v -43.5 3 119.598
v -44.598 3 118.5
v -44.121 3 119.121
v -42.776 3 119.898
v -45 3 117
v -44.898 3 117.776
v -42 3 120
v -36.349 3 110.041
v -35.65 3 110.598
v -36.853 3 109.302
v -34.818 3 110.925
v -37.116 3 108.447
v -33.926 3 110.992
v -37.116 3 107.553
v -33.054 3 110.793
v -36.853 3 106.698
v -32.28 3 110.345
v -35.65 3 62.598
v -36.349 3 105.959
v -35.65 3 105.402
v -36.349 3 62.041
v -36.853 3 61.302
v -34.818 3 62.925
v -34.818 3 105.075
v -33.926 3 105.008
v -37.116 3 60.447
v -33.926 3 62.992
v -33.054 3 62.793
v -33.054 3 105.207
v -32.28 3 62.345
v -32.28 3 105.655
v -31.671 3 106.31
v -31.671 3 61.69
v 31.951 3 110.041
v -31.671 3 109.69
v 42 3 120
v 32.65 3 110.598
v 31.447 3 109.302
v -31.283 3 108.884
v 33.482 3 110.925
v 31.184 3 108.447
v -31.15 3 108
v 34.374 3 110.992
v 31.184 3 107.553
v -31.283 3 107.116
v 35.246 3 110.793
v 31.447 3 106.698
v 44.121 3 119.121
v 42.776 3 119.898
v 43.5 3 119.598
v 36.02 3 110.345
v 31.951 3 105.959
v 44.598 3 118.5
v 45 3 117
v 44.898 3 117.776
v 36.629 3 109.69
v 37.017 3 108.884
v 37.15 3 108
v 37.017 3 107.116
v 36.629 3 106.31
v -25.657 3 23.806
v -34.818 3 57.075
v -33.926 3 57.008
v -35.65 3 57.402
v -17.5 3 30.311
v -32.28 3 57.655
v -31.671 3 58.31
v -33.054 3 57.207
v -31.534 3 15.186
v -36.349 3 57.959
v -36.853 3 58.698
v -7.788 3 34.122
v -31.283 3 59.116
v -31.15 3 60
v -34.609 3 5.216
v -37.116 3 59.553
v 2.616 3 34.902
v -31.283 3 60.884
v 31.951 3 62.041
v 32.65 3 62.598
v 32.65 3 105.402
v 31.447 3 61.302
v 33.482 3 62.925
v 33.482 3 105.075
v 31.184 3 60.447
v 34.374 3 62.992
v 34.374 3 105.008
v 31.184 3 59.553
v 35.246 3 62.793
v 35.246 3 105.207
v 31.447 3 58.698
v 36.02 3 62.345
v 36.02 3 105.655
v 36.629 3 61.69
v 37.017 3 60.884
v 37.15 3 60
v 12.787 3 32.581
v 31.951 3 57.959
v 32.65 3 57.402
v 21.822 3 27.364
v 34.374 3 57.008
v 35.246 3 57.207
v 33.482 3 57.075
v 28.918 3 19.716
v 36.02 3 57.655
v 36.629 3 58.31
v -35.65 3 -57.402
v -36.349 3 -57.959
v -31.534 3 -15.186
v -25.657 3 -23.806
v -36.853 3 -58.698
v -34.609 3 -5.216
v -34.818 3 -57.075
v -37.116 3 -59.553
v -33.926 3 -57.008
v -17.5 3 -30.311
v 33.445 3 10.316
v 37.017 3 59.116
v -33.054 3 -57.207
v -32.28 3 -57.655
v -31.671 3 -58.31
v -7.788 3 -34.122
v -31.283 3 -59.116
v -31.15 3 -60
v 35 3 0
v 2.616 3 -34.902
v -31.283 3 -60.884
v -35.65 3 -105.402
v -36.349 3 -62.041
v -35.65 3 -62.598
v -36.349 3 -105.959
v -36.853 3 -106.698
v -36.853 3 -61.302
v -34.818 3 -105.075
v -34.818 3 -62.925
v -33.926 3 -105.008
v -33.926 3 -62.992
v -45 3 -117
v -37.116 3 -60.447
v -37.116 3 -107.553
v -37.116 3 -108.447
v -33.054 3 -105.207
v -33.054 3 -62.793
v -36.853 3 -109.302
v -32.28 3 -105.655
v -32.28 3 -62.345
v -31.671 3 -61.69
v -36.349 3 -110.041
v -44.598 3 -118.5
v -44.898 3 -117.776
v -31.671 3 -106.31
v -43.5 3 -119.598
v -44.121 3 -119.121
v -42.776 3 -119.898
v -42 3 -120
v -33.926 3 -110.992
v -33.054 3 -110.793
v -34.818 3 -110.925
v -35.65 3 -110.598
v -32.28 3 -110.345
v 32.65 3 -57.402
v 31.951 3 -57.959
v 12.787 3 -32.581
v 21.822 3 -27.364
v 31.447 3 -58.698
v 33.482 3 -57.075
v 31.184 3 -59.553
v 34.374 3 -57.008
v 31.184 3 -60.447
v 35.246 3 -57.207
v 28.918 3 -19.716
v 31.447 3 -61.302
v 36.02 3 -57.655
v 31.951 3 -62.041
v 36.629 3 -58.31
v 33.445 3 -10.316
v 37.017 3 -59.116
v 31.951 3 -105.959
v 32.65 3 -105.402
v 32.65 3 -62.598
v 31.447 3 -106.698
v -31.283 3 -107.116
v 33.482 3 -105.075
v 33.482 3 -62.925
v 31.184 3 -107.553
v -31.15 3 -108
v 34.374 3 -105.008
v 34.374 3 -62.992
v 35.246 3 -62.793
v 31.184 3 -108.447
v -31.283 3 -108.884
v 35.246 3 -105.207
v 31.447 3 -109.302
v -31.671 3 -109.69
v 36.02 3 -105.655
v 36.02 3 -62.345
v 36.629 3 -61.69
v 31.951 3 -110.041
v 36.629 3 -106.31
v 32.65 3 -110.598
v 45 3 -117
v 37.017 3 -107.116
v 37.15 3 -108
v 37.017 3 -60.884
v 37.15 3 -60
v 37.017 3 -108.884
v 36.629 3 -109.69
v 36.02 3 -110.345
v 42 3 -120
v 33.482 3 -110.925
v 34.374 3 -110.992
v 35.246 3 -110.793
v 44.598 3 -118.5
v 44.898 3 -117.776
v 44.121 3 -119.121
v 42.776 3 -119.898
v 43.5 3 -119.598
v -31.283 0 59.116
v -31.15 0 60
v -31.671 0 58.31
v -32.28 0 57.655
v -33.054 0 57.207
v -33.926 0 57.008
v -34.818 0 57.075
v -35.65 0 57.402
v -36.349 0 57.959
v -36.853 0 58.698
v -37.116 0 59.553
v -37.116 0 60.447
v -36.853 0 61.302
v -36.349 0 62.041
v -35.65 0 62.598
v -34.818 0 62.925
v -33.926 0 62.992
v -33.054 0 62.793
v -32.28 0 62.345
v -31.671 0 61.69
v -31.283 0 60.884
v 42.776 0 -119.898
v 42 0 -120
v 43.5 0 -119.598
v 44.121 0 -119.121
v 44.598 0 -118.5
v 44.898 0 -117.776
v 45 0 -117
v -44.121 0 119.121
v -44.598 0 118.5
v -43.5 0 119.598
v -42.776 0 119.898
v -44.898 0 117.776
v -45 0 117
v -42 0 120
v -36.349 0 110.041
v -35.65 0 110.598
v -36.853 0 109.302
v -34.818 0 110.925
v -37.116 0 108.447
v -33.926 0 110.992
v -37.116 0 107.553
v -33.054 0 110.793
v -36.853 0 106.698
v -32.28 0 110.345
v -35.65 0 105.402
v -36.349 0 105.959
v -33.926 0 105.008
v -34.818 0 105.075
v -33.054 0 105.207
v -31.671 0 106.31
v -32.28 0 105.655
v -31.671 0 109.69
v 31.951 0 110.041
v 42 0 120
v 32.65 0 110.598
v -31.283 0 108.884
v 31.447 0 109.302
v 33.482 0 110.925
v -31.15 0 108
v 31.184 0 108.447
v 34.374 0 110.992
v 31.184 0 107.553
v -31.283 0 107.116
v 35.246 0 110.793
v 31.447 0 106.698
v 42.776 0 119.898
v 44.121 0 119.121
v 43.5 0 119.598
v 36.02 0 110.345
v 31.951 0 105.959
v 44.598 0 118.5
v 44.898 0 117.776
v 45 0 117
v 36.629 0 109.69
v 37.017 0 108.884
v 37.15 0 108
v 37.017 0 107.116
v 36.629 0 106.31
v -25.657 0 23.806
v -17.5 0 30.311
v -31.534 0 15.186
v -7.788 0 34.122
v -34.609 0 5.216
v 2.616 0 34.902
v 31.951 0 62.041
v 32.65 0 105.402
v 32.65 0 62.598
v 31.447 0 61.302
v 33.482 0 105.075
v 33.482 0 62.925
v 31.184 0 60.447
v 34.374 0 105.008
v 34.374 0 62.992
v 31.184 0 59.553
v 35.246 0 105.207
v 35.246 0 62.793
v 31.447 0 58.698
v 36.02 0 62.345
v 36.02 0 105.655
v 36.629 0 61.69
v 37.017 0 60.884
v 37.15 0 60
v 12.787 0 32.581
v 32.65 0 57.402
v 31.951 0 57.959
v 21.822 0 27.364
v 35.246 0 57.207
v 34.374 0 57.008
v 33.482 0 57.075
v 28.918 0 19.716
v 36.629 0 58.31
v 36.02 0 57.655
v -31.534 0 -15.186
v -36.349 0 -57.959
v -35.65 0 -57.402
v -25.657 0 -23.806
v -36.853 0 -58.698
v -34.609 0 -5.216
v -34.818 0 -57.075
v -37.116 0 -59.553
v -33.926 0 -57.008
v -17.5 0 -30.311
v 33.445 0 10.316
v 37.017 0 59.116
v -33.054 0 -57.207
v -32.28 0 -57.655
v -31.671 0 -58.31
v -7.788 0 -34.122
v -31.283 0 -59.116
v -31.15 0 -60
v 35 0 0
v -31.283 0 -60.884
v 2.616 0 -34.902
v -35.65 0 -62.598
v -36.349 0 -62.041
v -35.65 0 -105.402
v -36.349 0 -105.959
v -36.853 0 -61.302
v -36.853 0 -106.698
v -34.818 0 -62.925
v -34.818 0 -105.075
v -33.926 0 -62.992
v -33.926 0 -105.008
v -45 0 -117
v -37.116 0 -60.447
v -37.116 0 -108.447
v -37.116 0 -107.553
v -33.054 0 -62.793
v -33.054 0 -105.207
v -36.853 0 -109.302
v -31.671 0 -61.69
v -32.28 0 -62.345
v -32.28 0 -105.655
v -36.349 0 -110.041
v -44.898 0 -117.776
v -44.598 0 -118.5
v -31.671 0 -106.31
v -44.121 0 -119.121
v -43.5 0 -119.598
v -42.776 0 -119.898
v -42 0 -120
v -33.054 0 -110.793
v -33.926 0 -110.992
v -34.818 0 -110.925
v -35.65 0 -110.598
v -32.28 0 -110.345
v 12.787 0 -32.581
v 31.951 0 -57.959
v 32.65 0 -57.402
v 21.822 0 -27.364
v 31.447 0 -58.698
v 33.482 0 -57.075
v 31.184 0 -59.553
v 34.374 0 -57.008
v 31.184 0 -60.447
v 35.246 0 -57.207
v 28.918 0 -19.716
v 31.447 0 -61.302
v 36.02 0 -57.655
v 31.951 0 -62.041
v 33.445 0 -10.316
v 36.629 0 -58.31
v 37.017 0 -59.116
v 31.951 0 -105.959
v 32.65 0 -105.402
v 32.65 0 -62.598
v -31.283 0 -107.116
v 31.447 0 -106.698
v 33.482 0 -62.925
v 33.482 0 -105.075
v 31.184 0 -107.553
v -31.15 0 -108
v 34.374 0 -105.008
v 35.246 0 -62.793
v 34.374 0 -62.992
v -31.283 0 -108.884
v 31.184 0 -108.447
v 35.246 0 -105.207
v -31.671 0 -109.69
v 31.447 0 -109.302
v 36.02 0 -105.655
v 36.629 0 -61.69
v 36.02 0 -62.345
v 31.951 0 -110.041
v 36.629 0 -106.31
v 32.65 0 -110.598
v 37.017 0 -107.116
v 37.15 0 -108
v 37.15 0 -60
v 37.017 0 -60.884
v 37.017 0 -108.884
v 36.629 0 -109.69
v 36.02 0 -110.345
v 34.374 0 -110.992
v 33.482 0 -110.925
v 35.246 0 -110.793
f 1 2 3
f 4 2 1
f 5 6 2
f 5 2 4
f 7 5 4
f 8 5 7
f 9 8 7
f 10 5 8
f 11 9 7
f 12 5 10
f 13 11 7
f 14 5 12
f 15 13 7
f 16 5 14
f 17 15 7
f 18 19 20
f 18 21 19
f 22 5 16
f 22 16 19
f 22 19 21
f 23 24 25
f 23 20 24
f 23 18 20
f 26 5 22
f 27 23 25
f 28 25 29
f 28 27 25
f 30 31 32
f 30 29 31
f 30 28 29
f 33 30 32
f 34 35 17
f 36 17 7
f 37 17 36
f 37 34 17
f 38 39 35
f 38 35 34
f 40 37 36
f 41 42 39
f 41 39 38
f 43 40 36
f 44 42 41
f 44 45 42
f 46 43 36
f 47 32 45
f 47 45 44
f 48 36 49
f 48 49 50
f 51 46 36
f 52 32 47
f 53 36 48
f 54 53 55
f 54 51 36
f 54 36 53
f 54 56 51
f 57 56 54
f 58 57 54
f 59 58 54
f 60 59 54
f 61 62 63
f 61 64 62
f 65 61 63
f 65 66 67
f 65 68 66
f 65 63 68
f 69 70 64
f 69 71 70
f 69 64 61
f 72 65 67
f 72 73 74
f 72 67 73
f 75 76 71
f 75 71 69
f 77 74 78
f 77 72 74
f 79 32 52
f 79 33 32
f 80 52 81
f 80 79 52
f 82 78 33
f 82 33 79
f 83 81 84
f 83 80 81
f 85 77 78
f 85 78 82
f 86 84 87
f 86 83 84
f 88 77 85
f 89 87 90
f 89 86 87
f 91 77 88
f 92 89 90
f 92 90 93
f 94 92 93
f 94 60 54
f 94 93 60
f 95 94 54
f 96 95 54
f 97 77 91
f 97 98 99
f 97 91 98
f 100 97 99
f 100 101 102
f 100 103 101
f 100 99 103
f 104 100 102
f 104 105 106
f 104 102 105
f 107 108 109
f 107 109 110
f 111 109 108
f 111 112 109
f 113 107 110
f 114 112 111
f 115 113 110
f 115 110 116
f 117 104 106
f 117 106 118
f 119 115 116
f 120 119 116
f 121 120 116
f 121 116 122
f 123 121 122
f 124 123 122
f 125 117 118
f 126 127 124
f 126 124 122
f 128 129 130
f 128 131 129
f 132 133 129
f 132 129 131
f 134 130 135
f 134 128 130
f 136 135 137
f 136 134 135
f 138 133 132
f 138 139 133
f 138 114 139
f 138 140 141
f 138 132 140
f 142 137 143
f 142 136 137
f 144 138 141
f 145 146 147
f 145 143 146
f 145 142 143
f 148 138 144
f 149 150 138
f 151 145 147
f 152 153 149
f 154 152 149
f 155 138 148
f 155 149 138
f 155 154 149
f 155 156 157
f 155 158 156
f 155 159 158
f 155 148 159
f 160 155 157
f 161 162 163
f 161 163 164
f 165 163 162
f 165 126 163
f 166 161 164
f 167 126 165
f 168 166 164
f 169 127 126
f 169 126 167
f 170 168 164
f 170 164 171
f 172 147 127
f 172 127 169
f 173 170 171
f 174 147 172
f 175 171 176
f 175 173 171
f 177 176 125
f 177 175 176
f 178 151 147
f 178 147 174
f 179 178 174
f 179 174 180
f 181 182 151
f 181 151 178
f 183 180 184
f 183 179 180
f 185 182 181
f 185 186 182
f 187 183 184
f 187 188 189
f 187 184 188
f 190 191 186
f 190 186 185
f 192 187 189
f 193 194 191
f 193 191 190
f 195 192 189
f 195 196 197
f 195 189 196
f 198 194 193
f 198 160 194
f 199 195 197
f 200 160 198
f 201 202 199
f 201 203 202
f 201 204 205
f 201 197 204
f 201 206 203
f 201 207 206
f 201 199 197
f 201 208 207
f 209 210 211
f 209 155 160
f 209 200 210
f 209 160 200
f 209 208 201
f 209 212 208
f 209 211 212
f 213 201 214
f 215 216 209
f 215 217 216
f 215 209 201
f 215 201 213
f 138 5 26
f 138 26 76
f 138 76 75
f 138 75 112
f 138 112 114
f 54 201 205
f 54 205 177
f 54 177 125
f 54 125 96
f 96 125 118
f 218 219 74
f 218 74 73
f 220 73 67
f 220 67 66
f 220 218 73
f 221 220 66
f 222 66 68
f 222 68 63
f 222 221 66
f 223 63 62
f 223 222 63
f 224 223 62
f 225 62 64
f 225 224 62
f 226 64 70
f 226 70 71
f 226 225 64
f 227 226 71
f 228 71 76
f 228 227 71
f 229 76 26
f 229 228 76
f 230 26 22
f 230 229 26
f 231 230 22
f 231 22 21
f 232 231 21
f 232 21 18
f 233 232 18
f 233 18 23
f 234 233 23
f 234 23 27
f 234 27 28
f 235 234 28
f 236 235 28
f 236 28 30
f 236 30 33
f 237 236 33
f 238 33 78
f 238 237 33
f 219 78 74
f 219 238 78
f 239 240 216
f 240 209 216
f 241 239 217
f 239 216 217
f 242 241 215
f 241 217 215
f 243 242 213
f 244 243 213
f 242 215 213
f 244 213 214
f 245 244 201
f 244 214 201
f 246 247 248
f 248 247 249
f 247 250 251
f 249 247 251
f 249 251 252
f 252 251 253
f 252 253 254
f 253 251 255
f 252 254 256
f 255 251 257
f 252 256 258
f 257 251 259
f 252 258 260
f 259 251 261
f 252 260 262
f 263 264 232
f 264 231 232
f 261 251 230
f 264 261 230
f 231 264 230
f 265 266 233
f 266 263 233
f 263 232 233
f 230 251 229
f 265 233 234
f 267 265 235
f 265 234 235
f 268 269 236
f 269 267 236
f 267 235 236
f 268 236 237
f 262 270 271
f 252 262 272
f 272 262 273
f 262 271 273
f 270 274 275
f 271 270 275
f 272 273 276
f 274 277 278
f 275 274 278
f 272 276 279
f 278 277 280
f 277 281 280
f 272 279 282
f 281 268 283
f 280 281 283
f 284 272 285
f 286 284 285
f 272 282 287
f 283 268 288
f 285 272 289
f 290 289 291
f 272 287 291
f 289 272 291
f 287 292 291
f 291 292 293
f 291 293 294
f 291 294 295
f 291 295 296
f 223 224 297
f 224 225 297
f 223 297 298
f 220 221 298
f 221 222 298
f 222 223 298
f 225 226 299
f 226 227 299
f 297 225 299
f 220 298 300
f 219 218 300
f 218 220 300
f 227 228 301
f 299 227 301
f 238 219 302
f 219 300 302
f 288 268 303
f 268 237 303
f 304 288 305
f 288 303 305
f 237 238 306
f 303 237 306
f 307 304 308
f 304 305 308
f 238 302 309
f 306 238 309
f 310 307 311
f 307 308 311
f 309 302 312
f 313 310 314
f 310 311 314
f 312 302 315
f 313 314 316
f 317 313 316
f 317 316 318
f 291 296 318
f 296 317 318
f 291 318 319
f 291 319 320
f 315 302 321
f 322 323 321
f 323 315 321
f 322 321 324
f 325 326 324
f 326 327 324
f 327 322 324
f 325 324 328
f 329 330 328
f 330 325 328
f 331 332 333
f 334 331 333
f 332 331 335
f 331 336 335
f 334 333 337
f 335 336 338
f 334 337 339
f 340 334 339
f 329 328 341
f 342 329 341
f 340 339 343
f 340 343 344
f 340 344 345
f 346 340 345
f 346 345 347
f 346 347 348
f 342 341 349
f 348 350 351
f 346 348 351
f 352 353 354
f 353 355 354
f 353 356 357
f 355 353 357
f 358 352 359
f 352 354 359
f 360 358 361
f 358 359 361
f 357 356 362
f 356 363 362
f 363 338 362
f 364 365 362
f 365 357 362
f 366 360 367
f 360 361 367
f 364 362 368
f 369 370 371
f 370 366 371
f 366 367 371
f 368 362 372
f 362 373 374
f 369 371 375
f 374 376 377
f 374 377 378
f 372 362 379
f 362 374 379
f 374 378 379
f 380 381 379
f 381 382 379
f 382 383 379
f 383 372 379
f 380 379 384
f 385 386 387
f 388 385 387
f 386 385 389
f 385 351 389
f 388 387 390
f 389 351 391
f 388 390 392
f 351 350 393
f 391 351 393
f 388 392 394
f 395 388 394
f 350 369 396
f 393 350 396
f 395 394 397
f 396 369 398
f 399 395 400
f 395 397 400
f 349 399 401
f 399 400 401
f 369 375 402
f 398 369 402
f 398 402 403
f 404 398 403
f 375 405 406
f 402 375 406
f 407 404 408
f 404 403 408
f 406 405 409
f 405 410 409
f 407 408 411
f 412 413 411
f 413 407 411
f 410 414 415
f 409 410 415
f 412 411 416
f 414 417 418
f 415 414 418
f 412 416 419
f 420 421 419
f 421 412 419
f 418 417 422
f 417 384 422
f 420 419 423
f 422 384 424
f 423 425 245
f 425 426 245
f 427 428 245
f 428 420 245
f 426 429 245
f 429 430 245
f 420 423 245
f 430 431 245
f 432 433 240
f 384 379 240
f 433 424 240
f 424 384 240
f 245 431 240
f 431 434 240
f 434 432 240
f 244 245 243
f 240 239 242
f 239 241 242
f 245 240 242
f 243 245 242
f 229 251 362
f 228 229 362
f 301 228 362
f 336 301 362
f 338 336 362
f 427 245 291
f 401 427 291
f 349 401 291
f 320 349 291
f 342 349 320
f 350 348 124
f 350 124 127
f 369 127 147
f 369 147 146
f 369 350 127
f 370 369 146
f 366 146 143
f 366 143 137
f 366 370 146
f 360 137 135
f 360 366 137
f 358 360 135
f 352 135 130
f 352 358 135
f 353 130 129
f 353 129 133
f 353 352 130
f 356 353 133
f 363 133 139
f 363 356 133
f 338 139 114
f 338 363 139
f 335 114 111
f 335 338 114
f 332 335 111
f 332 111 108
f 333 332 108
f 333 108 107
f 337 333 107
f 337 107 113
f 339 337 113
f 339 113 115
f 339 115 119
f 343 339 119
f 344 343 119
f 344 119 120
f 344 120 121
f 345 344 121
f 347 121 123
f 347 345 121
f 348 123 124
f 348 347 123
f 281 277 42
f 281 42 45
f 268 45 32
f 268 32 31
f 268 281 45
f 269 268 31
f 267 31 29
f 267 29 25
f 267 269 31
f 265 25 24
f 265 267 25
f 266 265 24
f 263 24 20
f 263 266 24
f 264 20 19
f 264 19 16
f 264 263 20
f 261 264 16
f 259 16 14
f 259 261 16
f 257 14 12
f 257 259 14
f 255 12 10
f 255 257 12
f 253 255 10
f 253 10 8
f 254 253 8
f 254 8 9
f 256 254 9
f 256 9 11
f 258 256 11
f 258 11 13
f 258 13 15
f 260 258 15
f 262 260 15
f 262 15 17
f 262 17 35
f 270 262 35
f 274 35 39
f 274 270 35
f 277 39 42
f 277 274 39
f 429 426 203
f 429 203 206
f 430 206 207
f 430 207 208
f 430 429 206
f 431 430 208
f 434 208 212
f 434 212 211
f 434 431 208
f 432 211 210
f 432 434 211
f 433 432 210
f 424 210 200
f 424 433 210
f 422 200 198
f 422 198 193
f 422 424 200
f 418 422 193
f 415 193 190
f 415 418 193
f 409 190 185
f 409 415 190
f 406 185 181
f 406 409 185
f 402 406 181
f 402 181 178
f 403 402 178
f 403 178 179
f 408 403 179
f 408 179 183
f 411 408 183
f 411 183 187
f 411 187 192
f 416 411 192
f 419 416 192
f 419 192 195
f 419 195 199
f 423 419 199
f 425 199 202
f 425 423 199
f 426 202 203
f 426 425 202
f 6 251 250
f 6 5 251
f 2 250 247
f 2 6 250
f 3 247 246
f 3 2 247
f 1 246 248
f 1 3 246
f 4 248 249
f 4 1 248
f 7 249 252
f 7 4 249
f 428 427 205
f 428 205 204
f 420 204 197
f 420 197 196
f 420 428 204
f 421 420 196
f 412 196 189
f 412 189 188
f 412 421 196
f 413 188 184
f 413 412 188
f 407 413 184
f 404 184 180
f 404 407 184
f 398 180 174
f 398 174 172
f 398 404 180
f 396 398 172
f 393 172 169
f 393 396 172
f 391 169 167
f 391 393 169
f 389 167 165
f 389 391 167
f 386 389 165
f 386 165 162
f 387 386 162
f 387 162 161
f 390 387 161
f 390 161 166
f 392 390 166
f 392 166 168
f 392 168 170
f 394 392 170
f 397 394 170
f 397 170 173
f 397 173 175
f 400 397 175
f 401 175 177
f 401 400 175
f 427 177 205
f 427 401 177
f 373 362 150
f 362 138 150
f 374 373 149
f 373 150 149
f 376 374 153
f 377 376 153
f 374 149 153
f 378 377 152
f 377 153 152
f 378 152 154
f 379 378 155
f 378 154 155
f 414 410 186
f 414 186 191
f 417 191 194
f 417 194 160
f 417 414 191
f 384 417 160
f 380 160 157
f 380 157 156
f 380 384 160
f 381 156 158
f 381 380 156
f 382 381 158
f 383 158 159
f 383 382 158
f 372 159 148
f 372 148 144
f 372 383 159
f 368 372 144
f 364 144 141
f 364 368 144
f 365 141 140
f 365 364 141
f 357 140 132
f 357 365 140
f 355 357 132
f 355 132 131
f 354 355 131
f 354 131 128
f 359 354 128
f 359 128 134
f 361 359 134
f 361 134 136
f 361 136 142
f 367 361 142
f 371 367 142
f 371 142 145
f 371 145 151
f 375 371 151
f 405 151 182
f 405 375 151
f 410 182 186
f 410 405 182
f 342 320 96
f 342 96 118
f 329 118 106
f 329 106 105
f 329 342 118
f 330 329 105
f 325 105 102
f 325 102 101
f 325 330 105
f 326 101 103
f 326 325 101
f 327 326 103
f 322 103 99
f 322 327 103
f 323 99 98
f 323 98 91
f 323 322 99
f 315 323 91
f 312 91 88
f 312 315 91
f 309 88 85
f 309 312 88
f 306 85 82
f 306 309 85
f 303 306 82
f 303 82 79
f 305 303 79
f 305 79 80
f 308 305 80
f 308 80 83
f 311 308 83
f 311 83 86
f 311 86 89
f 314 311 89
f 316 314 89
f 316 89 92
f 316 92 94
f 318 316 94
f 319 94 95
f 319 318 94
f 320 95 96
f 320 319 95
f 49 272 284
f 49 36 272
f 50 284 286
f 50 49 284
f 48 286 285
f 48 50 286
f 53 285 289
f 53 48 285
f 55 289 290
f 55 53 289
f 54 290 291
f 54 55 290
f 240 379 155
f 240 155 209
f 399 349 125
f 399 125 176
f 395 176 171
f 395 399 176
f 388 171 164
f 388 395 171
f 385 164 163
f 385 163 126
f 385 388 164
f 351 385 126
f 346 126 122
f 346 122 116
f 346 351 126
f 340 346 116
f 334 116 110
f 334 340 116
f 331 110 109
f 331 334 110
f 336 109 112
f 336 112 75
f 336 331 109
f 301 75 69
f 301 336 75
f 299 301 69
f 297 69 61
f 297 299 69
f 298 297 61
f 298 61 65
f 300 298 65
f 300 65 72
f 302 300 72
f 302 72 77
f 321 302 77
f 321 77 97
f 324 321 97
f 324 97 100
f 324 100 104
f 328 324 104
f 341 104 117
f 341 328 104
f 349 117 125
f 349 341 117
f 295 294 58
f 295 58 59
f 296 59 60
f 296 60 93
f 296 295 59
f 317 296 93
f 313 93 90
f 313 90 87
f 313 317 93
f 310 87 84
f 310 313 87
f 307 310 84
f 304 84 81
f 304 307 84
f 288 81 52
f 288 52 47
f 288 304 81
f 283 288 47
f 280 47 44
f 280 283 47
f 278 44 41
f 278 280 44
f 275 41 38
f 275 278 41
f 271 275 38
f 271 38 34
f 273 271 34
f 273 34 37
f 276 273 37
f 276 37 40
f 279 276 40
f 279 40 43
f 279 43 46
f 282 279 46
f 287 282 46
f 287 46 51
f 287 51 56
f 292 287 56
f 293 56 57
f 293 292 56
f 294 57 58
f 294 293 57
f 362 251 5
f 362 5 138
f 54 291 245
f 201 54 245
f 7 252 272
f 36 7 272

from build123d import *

# Parameters (mm, degrees)
SKETCH1_W           = 90
SKETCH1_H           = 240
SKETCH1_R           = 35
SKETCH1_R_2         = 3
BOSS_EXTRUDE1_DEPTH = 3
FILLET1_R           = 3


with BuildPart() as part:
    # Sketch1 → Boss-Extrude1 (new body)
    with BuildSketch(Plane(origin=(0, 0, 0), x_dir=(1, 0, 0), z_dir=(0, 1, 0))):
        Rectangle(SKETCH1_W, SKETCH1_H)
        Circle(SKETCH1_R, mode=Mode.SUBTRACT)
        with Locations((-34.15, 60)):
            Circle(SKETCH1_R_2, mode=Mode.SUBTRACT)
        with Locations((34.15, 60)):
            Circle(SKETCH1_R_2, mode=Mode.SUBTRACT)
        with Locations((34.15, -60)):
            Circle(SKETCH1_R_2, mode=Mode.SUBTRACT)
        with Locations((-34.15, -60)):
            Circle(SKETCH1_R_2, mode=Mode.SUBTRACT)
        with Locations((-34.15, 108)):
            Circle(SKETCH1_R_2, mode=Mode.SUBTRACT)
        with Locations((34.15, 108)):
            Circle(SKETCH1_R_2, mode=Mode.SUBTRACT)
        with Locations((-34.15, -108)):
            Circle(SKETCH1_R_2, mode=Mode.SUBTRACT)
        with Locations((34.15, -108)):
            Circle(SKETCH1_R_2, mode=Mode.SUBTRACT)
    extrude(amount=BOSS_EXTRUDE1_DEPTH)

    # Fillet1
    fillet1_edges = [part.edges().sort_by_distance(p)[0] for p in [
        (45, 1.5, 120),
        (-45, 1.5, 120),
        (-45, 1.5, -120),
        (45, 1.5, -120),
    ]]
    fillet(fillet1_edges, radius=FILLET1_R)


solid = part.part
